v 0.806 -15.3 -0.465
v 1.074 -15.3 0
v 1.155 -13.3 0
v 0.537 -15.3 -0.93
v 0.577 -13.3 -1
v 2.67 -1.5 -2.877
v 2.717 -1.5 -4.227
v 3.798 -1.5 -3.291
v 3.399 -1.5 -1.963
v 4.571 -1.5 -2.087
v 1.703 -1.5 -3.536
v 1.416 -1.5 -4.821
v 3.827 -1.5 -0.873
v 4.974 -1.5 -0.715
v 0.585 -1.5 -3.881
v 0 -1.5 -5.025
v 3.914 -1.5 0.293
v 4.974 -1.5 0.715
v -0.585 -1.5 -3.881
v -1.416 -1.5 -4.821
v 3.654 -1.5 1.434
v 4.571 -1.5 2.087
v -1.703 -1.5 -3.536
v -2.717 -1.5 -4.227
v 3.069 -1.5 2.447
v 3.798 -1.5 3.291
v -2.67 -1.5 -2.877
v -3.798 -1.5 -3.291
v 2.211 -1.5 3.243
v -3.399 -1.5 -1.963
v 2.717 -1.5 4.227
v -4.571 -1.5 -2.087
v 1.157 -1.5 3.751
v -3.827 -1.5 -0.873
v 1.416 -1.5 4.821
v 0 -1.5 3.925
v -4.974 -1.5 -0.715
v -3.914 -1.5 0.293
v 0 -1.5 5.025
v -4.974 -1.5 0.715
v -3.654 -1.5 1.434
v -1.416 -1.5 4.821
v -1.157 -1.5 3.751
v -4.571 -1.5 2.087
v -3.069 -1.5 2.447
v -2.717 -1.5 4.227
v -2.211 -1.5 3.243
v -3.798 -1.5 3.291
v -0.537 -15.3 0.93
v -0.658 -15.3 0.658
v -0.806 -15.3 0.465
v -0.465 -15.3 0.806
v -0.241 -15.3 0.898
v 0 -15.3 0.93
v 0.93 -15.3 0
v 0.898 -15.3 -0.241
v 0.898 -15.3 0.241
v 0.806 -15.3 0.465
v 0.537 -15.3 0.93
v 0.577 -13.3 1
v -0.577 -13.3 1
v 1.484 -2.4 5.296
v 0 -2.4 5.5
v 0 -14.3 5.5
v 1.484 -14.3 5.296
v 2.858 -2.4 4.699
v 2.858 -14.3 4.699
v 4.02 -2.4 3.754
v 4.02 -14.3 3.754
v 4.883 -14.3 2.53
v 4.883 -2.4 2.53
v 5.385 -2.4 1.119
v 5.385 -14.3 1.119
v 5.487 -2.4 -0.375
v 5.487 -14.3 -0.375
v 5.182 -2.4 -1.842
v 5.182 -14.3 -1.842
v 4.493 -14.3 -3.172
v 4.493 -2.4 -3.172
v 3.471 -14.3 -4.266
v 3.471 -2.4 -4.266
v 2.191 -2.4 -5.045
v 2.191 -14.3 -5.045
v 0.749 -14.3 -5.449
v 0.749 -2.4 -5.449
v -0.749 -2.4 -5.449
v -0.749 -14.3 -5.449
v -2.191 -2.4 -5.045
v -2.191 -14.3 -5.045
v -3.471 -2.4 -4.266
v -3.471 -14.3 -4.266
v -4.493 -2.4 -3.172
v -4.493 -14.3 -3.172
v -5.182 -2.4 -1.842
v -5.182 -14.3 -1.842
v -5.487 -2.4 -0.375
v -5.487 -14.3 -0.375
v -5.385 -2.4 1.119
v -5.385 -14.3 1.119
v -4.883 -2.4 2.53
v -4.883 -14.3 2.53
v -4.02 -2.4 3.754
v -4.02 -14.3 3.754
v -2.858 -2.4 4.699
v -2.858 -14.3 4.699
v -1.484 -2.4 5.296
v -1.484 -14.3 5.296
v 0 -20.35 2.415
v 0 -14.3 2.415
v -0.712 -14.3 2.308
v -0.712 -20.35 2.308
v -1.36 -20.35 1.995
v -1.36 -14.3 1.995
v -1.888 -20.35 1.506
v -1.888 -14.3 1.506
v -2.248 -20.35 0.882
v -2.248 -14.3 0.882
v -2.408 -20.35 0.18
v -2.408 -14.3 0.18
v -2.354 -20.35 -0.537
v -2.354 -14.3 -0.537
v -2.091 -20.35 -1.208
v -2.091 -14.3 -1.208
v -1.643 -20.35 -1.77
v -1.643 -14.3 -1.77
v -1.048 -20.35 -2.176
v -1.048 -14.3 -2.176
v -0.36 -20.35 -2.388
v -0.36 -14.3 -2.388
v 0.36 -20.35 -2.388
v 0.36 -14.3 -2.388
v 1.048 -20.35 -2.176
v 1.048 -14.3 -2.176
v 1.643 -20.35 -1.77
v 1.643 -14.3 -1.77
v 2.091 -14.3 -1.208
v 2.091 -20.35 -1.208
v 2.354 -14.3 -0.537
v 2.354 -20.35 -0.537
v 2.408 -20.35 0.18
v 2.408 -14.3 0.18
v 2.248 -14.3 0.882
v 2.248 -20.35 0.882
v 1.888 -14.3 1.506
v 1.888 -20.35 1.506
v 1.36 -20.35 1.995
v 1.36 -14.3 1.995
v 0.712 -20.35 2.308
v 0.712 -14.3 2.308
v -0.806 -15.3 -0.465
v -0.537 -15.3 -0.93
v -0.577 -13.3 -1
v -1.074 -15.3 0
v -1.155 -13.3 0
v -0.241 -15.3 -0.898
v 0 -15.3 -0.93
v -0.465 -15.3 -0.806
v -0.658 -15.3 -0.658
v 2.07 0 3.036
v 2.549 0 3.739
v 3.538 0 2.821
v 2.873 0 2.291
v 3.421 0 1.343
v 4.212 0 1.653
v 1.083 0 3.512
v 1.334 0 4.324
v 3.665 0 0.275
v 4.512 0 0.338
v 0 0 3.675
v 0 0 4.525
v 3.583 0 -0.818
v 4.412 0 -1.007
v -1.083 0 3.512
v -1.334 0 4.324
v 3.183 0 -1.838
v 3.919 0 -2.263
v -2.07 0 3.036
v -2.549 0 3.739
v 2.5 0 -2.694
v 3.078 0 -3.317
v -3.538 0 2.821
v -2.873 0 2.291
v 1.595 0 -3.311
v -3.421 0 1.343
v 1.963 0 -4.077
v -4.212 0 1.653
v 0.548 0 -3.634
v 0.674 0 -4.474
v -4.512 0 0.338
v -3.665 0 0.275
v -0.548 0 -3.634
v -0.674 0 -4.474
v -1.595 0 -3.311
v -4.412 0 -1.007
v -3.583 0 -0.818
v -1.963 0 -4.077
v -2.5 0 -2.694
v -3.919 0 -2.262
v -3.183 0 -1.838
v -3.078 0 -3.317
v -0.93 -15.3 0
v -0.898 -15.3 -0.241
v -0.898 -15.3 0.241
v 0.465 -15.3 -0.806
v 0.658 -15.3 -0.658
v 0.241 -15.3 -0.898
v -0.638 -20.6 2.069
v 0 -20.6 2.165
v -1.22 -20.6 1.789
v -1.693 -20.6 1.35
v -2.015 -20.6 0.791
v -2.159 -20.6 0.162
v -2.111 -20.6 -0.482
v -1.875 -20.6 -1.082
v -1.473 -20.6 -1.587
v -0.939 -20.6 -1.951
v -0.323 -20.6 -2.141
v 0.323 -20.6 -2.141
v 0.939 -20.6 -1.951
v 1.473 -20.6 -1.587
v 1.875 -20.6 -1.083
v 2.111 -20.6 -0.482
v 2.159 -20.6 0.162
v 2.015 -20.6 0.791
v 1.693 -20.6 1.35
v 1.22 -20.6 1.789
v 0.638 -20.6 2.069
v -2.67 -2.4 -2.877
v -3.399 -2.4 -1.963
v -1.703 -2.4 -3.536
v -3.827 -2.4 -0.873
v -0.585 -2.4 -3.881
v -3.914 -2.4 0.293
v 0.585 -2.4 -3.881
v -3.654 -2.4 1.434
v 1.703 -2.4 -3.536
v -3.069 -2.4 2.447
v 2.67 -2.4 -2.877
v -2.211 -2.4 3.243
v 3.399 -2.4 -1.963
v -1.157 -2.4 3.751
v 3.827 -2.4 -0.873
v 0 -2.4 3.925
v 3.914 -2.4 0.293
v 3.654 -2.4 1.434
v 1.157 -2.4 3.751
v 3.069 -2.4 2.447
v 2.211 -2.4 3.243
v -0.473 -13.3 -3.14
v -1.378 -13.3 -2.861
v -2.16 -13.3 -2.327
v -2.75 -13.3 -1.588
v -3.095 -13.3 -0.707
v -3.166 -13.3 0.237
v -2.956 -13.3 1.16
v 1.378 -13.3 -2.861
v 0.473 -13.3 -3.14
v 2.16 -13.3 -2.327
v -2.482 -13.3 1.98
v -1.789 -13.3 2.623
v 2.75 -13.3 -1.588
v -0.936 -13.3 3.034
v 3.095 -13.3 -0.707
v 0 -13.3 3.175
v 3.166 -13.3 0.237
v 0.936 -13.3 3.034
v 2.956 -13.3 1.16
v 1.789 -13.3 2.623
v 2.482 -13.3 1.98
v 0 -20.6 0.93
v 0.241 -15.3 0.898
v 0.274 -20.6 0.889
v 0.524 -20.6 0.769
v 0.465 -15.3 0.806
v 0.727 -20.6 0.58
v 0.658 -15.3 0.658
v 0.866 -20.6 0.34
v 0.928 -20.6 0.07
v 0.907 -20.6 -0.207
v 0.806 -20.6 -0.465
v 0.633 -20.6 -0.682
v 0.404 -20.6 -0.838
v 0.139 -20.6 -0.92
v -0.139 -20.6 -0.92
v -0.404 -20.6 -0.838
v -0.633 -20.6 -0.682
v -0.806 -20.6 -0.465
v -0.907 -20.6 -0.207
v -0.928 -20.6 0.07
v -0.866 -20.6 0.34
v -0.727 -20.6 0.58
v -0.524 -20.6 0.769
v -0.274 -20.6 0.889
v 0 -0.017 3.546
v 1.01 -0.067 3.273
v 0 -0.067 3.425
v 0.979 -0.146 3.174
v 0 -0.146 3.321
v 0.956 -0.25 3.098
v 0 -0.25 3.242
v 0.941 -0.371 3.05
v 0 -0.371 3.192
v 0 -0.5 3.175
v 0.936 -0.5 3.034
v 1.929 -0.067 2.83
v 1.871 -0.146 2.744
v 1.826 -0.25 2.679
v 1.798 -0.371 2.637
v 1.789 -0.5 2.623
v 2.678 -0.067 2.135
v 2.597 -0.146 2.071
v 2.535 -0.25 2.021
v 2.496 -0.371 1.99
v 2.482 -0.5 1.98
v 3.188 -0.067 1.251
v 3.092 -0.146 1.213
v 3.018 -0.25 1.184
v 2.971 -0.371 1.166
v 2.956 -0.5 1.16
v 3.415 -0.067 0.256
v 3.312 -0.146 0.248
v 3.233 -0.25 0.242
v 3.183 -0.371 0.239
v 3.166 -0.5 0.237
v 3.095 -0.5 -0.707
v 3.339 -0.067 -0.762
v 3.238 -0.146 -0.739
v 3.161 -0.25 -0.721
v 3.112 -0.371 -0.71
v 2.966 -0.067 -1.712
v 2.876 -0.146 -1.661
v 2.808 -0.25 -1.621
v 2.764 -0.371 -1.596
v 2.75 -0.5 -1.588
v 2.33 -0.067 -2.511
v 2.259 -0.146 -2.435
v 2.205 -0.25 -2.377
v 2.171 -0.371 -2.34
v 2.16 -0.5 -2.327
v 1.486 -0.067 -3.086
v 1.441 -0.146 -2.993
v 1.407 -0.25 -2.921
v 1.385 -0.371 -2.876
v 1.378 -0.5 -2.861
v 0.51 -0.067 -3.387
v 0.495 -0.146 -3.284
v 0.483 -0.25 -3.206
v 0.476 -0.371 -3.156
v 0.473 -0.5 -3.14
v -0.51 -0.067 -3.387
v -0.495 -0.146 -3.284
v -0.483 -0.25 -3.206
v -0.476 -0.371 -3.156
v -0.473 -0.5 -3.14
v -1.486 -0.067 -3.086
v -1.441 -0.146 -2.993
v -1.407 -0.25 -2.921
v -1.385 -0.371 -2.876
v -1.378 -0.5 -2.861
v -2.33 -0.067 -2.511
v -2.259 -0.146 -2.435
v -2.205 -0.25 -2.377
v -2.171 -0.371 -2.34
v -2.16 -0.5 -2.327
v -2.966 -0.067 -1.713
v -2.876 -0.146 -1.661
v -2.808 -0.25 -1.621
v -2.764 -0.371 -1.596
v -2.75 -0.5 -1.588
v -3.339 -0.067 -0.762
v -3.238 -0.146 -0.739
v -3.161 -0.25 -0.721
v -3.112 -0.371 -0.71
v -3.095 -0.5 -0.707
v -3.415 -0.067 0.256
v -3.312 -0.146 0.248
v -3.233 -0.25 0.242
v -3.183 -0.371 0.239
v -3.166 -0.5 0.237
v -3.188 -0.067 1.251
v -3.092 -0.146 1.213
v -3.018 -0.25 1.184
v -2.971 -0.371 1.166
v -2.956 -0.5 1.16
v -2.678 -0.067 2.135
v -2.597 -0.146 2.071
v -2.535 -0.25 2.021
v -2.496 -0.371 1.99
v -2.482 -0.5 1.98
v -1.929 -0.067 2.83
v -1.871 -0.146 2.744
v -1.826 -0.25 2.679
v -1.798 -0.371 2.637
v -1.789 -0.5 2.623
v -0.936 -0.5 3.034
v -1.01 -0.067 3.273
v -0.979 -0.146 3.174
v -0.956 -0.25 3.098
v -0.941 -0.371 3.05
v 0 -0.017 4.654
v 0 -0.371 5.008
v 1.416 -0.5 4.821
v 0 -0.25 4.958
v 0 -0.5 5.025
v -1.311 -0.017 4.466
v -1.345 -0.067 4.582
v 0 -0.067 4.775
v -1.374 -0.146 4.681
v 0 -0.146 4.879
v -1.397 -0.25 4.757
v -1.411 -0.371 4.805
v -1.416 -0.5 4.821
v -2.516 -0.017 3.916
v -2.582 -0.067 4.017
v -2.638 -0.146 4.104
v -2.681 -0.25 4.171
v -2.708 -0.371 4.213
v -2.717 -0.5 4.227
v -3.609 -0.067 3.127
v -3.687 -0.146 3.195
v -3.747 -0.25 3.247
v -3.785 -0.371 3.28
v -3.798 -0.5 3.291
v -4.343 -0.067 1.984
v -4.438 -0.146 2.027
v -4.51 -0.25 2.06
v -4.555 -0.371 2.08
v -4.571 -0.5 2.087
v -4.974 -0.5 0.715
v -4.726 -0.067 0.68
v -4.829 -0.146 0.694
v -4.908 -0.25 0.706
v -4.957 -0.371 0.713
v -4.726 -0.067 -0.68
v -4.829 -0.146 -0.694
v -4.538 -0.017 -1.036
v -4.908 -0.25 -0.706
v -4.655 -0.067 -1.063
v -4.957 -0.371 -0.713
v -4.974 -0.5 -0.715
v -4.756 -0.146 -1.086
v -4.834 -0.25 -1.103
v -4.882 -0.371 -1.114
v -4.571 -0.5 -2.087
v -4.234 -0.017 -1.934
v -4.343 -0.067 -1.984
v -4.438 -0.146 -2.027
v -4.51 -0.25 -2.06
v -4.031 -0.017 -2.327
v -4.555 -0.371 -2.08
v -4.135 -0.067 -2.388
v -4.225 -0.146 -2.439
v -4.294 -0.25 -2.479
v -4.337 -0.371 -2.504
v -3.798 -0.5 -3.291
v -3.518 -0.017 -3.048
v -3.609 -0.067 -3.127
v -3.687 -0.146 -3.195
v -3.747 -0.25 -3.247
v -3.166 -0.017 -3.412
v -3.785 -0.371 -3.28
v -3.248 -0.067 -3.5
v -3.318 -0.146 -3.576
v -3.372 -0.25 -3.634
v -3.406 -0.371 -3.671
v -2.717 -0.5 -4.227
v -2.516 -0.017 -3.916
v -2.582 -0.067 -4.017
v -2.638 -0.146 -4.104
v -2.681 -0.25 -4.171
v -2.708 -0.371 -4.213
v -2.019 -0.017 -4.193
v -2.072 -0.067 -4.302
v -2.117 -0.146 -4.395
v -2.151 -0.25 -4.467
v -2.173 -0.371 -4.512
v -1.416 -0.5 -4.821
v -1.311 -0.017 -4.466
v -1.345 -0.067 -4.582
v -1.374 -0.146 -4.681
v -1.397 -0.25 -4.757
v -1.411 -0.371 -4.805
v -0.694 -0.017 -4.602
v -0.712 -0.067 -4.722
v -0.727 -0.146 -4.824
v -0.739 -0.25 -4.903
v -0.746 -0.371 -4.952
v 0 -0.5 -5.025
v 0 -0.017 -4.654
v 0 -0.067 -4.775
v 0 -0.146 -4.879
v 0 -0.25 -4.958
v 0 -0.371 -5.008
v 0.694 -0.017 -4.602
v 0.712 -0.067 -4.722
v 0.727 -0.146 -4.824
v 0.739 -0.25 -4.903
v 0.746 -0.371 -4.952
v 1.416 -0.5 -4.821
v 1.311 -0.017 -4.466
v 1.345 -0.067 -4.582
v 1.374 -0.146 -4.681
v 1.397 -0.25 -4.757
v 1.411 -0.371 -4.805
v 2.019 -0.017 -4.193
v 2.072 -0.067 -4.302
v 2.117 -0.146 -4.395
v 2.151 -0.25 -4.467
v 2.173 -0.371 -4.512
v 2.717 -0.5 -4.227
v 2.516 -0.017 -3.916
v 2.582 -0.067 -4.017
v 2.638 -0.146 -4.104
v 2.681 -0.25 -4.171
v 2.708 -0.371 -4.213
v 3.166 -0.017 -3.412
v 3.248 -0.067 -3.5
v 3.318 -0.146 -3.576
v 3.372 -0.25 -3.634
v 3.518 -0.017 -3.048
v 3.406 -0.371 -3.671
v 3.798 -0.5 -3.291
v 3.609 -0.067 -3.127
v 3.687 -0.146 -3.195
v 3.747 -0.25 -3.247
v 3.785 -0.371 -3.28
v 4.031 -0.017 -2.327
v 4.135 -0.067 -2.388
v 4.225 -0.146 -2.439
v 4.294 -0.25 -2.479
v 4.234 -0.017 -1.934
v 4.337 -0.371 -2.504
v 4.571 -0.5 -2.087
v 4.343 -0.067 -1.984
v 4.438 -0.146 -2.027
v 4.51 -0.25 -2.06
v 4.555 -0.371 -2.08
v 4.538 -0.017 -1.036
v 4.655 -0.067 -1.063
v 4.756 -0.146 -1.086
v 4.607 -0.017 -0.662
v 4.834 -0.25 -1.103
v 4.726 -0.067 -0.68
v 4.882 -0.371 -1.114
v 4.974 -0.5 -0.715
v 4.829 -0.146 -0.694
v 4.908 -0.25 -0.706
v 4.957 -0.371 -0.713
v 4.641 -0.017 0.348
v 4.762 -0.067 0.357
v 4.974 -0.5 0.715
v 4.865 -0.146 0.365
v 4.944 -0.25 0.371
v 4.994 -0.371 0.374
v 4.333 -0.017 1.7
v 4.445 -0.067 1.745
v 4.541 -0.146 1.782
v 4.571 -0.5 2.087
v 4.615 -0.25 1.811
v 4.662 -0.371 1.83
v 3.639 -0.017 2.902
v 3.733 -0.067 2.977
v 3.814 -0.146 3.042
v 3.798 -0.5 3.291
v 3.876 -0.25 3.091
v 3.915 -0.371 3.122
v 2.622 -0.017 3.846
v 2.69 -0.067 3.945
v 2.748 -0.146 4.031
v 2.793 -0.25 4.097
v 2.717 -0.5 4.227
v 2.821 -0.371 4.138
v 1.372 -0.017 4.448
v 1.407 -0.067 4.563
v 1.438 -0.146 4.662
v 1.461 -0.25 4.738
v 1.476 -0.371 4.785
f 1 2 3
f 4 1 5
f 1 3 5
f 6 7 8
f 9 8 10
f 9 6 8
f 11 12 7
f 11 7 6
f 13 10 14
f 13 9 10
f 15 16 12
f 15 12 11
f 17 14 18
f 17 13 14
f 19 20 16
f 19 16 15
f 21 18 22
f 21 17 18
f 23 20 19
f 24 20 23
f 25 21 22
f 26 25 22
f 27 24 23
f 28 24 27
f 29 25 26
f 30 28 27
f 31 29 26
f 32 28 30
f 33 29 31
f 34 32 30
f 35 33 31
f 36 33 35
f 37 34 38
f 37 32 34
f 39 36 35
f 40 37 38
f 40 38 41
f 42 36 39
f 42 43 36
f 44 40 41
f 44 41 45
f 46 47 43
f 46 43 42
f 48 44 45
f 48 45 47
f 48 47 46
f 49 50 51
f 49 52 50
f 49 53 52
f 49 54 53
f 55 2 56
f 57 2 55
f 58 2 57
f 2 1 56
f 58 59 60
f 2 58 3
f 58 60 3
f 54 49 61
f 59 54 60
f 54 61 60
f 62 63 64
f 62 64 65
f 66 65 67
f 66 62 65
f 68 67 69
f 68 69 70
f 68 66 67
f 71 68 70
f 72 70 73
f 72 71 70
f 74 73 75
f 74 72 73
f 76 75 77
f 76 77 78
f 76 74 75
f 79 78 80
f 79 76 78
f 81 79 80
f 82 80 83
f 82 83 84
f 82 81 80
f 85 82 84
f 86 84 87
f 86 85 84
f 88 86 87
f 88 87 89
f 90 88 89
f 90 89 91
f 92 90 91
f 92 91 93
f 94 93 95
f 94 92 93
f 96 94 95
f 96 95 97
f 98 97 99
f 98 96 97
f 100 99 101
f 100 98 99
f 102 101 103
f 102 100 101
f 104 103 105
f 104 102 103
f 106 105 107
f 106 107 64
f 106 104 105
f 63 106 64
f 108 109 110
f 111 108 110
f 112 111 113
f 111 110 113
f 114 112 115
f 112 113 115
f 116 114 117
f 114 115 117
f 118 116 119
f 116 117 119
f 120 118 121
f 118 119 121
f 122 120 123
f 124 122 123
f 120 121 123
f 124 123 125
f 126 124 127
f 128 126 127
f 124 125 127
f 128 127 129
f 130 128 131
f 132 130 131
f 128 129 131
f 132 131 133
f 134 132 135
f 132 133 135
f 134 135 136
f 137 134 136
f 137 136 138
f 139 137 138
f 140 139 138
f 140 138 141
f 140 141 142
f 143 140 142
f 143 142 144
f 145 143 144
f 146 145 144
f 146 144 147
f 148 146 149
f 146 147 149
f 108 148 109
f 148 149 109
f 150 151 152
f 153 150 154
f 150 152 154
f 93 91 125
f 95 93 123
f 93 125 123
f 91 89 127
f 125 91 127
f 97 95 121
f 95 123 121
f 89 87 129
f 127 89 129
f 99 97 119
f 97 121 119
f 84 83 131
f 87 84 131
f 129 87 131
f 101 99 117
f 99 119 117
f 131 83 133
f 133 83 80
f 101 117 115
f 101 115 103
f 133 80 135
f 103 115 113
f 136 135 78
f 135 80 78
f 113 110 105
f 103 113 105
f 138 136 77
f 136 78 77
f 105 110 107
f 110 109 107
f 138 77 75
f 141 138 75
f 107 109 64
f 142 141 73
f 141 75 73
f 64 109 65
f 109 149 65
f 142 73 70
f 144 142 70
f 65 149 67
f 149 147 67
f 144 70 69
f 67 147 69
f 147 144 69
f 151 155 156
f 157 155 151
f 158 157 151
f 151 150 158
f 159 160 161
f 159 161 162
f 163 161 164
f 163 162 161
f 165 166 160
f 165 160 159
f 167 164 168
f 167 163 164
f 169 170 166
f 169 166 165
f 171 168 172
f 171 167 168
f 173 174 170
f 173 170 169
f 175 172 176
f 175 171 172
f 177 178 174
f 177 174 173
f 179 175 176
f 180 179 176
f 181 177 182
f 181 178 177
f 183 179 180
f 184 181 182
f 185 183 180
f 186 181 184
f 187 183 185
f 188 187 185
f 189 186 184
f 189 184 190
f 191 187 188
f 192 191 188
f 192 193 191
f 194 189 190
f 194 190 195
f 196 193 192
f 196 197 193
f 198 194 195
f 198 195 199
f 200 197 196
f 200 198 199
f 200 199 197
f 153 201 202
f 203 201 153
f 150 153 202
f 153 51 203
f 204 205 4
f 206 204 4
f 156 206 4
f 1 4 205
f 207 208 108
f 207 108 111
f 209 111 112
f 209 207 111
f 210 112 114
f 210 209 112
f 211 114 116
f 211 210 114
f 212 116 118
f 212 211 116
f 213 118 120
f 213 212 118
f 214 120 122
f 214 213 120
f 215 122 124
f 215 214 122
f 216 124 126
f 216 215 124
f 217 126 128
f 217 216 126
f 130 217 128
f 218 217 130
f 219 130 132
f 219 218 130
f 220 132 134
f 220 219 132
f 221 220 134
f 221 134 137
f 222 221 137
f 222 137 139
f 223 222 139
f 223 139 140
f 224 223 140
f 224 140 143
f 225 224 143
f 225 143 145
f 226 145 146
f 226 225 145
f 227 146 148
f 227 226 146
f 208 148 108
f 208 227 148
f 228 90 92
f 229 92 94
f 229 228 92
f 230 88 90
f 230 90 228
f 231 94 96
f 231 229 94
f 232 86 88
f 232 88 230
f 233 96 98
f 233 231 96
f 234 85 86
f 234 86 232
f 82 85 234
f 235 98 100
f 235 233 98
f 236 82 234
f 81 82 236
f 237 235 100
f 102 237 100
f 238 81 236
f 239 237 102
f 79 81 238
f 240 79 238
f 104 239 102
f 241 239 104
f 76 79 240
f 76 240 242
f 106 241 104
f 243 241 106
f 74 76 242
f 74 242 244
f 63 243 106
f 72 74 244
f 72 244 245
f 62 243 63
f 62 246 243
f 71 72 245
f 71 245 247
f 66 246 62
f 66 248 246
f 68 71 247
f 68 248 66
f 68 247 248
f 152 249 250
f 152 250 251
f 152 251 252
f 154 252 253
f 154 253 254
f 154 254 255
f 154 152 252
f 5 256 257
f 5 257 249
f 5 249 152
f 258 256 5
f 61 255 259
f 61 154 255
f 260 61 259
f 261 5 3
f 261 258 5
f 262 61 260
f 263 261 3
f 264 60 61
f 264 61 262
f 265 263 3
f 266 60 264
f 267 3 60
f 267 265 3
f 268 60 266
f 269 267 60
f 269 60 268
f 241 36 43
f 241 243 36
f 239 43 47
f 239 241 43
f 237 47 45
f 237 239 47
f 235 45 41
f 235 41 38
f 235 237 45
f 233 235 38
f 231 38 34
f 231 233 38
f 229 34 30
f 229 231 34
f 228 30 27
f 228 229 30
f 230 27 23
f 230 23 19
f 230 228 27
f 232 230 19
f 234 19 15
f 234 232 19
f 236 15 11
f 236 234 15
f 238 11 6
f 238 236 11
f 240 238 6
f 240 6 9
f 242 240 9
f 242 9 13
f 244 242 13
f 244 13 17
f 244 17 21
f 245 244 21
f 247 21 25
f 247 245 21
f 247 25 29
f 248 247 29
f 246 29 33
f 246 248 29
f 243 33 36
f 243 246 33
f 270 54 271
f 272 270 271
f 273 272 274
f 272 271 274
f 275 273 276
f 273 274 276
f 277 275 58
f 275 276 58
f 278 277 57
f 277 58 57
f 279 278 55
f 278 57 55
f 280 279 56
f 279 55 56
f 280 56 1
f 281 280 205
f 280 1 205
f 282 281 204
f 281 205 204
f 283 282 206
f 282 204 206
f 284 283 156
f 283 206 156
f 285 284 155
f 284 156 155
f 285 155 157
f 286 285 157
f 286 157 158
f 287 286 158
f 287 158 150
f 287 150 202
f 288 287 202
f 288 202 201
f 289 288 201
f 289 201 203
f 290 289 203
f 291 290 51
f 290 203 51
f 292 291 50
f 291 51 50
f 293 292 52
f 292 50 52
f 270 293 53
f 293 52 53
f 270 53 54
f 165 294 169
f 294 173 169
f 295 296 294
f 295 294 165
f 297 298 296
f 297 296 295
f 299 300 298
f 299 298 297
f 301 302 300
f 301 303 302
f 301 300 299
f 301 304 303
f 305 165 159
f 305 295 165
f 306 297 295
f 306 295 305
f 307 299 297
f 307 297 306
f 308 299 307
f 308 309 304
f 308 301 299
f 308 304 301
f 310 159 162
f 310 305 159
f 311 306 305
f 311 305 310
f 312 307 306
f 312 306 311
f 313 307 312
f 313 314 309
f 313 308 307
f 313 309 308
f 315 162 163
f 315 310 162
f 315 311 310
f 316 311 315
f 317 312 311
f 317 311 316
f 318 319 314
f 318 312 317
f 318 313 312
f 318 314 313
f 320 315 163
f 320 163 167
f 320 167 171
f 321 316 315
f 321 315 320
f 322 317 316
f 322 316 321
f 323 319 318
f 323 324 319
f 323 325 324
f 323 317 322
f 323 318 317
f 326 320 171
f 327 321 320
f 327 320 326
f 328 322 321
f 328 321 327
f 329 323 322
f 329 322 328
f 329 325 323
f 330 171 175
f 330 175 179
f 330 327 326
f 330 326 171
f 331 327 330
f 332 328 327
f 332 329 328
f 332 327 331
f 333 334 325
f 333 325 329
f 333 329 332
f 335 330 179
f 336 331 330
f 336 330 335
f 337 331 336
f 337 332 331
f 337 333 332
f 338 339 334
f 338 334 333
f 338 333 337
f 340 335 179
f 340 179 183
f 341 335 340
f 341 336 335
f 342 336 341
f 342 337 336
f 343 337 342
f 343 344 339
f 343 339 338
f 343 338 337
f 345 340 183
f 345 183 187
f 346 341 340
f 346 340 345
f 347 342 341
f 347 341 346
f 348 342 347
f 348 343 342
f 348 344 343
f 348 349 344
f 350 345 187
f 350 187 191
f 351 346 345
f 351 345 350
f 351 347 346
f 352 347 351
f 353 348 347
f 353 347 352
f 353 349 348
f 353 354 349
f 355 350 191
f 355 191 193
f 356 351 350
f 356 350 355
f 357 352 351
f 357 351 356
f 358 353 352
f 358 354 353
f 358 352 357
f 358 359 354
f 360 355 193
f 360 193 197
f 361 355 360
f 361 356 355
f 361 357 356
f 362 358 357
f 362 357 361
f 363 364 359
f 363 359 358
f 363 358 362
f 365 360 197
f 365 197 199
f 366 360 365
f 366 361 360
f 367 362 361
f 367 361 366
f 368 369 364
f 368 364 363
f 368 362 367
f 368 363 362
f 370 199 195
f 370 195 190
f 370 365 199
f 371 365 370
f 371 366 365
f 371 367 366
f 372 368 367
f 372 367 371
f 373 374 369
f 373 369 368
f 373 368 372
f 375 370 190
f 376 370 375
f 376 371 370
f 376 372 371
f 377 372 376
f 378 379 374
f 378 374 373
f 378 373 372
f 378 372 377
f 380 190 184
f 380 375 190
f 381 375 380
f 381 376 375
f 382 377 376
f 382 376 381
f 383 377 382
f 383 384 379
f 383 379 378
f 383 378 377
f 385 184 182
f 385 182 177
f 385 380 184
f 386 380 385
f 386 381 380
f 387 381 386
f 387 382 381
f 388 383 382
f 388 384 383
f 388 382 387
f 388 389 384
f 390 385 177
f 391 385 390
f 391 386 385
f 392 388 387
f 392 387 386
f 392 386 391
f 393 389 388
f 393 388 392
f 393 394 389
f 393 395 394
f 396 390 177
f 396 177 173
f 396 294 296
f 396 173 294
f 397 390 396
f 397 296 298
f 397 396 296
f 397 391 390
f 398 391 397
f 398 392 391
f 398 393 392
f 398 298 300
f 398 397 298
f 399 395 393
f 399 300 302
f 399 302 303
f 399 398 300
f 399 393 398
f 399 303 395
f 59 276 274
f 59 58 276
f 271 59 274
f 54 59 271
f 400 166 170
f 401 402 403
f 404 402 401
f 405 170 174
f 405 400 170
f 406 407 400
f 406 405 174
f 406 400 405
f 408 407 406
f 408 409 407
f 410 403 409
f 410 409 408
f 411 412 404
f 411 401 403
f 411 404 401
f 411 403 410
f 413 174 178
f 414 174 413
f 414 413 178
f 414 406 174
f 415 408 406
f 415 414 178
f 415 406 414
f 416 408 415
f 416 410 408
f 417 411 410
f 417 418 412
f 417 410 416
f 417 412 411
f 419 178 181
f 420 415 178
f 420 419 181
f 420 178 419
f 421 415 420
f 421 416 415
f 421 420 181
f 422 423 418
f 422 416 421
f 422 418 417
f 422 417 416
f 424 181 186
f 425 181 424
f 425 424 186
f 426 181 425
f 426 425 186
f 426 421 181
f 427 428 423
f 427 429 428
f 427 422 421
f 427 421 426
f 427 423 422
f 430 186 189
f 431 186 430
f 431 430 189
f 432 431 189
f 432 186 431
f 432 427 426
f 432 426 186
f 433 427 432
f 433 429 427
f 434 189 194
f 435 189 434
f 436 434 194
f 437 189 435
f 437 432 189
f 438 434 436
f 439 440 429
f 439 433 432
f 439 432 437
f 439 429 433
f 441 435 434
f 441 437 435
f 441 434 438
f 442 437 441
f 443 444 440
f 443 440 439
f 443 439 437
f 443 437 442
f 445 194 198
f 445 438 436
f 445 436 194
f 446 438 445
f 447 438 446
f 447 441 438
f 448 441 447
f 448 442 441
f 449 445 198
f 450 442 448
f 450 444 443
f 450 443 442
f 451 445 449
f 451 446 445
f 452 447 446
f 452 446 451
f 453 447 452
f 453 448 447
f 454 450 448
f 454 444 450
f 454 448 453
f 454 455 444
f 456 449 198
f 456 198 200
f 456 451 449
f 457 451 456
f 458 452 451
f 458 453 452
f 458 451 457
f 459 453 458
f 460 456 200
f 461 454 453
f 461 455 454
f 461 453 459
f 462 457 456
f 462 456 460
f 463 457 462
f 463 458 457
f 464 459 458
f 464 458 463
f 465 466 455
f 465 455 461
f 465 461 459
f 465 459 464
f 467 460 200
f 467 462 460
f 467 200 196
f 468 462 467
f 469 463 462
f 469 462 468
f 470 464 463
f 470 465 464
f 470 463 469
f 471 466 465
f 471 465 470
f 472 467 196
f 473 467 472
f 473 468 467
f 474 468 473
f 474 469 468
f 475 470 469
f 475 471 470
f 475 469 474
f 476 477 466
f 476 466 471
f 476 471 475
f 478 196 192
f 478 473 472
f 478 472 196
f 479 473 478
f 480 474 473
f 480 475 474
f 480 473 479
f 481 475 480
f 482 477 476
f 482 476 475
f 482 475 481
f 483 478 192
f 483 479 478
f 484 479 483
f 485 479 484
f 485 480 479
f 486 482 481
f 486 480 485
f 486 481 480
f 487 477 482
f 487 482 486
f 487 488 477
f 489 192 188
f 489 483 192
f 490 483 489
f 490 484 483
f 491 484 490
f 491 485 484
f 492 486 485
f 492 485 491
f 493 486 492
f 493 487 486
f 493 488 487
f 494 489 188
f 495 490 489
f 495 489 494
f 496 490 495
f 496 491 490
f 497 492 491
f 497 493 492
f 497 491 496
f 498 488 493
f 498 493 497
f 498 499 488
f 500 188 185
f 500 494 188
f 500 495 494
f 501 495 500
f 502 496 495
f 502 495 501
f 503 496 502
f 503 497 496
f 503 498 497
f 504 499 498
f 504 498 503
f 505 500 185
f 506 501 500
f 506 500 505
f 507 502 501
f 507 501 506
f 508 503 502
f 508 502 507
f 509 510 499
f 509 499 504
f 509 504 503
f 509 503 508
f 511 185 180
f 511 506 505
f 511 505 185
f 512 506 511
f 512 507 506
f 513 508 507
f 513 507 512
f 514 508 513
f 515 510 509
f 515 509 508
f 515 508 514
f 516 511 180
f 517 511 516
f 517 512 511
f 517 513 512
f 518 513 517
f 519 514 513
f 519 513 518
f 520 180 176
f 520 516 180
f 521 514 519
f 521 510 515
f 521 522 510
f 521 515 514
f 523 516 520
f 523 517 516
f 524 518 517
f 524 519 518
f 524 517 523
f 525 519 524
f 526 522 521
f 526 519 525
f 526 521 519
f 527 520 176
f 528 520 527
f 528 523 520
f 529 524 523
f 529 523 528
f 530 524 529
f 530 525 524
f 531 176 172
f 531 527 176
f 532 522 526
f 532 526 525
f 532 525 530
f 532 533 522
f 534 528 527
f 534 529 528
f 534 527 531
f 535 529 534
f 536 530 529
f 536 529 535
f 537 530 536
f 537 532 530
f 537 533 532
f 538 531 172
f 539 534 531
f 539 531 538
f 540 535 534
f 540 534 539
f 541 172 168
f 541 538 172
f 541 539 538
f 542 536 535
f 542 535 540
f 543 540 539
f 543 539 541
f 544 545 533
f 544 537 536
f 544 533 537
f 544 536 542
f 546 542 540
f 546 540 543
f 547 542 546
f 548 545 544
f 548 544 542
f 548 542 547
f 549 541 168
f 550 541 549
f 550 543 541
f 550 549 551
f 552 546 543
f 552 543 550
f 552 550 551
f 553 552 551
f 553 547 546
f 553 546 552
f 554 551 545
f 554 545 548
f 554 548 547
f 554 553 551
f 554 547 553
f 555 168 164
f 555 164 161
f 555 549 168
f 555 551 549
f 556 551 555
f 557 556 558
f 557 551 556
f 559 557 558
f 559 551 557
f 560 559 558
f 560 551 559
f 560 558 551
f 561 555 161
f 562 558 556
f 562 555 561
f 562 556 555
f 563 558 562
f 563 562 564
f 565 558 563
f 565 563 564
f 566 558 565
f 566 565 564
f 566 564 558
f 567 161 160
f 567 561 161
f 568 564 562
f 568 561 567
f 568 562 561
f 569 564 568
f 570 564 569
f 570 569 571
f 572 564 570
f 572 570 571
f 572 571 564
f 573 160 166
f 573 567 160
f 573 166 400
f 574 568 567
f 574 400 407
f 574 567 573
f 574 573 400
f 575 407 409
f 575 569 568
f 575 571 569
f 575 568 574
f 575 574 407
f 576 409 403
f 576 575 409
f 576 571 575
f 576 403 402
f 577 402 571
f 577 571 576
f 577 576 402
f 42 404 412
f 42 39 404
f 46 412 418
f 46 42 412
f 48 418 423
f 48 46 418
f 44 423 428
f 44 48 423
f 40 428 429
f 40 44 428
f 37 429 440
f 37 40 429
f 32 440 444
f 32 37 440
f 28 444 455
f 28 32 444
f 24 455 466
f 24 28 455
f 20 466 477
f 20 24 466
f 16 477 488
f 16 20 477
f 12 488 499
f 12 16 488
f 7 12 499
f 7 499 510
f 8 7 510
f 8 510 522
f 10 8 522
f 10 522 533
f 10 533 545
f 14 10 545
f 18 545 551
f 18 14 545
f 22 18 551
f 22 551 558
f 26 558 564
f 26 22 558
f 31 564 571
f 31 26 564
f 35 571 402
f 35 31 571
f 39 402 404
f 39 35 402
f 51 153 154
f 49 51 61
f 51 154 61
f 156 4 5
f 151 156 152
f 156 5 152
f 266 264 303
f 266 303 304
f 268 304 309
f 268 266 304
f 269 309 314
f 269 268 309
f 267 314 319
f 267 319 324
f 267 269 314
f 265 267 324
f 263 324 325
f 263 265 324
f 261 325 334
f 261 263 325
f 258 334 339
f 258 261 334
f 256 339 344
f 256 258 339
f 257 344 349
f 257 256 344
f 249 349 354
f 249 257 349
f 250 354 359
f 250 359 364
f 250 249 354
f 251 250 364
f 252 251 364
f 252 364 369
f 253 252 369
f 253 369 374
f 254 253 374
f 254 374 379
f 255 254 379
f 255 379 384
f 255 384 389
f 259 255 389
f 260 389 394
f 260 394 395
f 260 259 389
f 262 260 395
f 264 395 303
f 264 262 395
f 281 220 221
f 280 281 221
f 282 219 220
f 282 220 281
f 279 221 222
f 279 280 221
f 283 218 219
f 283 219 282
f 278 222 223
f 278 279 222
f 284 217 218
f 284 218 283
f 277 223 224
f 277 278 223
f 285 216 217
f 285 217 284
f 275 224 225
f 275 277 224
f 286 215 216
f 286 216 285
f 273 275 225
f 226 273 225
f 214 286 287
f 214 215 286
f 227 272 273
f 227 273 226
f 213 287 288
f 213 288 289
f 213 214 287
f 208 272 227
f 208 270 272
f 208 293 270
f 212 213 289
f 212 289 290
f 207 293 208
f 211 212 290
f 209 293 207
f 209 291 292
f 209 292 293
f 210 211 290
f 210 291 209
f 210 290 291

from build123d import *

# Parameters (mm, degrees)
UBODY_SKETCH_R      = 5.5
UBODY_DEPTH         = 11.9
THREAD_SKETCH_W     = 2.415
THREAD_SKETCH_H     = 6.3
THREAD_CHAMFER_SIZE = 0.25
TUBE_START          = -13.3
TUBE_SKETCH_R       = 3.175
TUBE_DEPTH          = 13.3
TUBE_RADIUS_R       = 0.5
HEX_2_DEPTH         = 2
HEX_2_DRAFT         = -2
PORT_SKETCH_R       = 0.930158461
PORT_DEPTH          = 18.163624326


with BuildPart() as part:
    # Release_Sketch → Release (revolve)
    with BuildSketch(Plane.XY, mode=Mode.PRIVATE) as release_sk:
        with BuildLine():
            Line((0, 0), (-4.525, 0))
            ThreePointArc((-4.525, 0), (-4.878553391, -0.146446609), (-5.025, -0.5))
            Line((-5.025, -0.5), (-5.025, -1.5))
            Line((-5.025, -1.5), (-3.925, -1.5))
            Line((-3.925, -1.5), (-3.925, -2.4))
            Line((-3.925, -2.4), (0, -2.4))
            Line((0, -2.4), (0, 0))
        make_face()
    revolve(release_sk.sketch.rotate(Axis((0, 0, 0), (0, -1, 0)), 270), axis=Axis((0, 0, 0), (0, -1, 0)))

    # UBody_Sketch → UBody (add)
    with BuildSketch(Plane(origin=(0, -2.4, 0), x_dir=(-1, 0, 0), z_dir=(0, 1, 0))):
        with Locations(Location((0, 0, 0), (0, 0, 90))):
            Circle(UBODY_SKETCH_R)
    extrude(amount=-UBODY_DEPTH)

    # Thread_Sketch → Thread (revolve)
    with BuildSketch(Plane.XY, mode=Mode.PRIVATE) as thread_sk:
        with Locations((-1.2075, -17.45)):
            Rectangle(THREAD_SKETCH_W, THREAD_SKETCH_H)
    revolve(thread_sk.sketch.rotate(Axis((0, 0, 0), (0, -1, 0)), 270), axis=Axis((0, 0, 0), (0, -1, 0)))

    # Thread_Chamfer
    thread_chamfer_edges = [part.edges().sort_by_distance(p)[0] for p in [
        (0, -20.6, -2.415),
    ]]
    chamfer(thread_chamfer_edges, length=THREAD_CHAMFER_SIZE)

    # Tube_Sketch → Tube (cut)
    with BuildSketch(Plane(origin=(0, 0, 0), x_dir=(1, 0, 0), z_dir=(0, 1, 0)).offset(TUBE_START)):
        with Locations(Location((0, 0, 0), (0, 0, 270))):
            Circle(TUBE_SKETCH_R)
    extrude(amount=TUBE_DEPTH, mode=Mode.SUBTRACT)

    # Tube_Radius
    tube_radius_edges = [part.edges().sort_by_distance(p)[0] for p in [
        (0, 0, -3.175),
    ]]
    fillet(tube_radius_edges, radius=TUBE_RADIUS_R)


with BuildPart() as hex_2_tool:
    # Hex_Sketch → Hex 2 (with draft: the straight prism first)
    with BuildSketch(Plane(origin=(0, -13.3, 0), x_dir=(-1, 0, 0), z_dir=(0, 1, 0))):
        Polygon((-1.154700538, 0), (-0.577350269, -1), (0.577350269, -1), (1.154700538, 0), (0.577350269, 1), (-0.577350269, 1), align=None)
    extrude(amount=-HEX_2_DEPTH)
    # Hex 2: the draft: its side faces are tilted about the plane it starts from
    hex_2_sides = [hex_2_tool.faces().sort_by_distance(p)[0] for p in [
        (0.866025404, -14.3, -0.5),
        (0, -14.3, -1),
        (-0.866025404, -14.3, -0.5),
        (-0.866025404, -14.3, 0.5),
        (0, -14.3, 1),
        (0.866025404, -14.3, 0.5),
    ]]
    draft(hex_2_sides, Plane(origin=(0, -13.3, 0), x_dir=(-1, 0, 0), z_dir=(0, 1, 0)), HEX_2_DRAFT)


with BuildPart() as part_1:
    add(part.part)

    # Hex 2: cut by hex_2_tool
    add(hex_2_tool.part, mode=Mode.SUBTRACT)

    # Port_Sketch → Port (cut, through all)
    with BuildSketch(Plane(origin=(0, -15.3, 0), x_dir=(-1, 0, 0), z_dir=(0, 1, 0))):
        with Locations(Location((0, 0, 0), (0, 0, 90))):
            Circle(PORT_SKETCH_R)
    extrude(amount=-PORT_DEPTH, mode=Mode.SUBTRACT)


solid = part_1.part
